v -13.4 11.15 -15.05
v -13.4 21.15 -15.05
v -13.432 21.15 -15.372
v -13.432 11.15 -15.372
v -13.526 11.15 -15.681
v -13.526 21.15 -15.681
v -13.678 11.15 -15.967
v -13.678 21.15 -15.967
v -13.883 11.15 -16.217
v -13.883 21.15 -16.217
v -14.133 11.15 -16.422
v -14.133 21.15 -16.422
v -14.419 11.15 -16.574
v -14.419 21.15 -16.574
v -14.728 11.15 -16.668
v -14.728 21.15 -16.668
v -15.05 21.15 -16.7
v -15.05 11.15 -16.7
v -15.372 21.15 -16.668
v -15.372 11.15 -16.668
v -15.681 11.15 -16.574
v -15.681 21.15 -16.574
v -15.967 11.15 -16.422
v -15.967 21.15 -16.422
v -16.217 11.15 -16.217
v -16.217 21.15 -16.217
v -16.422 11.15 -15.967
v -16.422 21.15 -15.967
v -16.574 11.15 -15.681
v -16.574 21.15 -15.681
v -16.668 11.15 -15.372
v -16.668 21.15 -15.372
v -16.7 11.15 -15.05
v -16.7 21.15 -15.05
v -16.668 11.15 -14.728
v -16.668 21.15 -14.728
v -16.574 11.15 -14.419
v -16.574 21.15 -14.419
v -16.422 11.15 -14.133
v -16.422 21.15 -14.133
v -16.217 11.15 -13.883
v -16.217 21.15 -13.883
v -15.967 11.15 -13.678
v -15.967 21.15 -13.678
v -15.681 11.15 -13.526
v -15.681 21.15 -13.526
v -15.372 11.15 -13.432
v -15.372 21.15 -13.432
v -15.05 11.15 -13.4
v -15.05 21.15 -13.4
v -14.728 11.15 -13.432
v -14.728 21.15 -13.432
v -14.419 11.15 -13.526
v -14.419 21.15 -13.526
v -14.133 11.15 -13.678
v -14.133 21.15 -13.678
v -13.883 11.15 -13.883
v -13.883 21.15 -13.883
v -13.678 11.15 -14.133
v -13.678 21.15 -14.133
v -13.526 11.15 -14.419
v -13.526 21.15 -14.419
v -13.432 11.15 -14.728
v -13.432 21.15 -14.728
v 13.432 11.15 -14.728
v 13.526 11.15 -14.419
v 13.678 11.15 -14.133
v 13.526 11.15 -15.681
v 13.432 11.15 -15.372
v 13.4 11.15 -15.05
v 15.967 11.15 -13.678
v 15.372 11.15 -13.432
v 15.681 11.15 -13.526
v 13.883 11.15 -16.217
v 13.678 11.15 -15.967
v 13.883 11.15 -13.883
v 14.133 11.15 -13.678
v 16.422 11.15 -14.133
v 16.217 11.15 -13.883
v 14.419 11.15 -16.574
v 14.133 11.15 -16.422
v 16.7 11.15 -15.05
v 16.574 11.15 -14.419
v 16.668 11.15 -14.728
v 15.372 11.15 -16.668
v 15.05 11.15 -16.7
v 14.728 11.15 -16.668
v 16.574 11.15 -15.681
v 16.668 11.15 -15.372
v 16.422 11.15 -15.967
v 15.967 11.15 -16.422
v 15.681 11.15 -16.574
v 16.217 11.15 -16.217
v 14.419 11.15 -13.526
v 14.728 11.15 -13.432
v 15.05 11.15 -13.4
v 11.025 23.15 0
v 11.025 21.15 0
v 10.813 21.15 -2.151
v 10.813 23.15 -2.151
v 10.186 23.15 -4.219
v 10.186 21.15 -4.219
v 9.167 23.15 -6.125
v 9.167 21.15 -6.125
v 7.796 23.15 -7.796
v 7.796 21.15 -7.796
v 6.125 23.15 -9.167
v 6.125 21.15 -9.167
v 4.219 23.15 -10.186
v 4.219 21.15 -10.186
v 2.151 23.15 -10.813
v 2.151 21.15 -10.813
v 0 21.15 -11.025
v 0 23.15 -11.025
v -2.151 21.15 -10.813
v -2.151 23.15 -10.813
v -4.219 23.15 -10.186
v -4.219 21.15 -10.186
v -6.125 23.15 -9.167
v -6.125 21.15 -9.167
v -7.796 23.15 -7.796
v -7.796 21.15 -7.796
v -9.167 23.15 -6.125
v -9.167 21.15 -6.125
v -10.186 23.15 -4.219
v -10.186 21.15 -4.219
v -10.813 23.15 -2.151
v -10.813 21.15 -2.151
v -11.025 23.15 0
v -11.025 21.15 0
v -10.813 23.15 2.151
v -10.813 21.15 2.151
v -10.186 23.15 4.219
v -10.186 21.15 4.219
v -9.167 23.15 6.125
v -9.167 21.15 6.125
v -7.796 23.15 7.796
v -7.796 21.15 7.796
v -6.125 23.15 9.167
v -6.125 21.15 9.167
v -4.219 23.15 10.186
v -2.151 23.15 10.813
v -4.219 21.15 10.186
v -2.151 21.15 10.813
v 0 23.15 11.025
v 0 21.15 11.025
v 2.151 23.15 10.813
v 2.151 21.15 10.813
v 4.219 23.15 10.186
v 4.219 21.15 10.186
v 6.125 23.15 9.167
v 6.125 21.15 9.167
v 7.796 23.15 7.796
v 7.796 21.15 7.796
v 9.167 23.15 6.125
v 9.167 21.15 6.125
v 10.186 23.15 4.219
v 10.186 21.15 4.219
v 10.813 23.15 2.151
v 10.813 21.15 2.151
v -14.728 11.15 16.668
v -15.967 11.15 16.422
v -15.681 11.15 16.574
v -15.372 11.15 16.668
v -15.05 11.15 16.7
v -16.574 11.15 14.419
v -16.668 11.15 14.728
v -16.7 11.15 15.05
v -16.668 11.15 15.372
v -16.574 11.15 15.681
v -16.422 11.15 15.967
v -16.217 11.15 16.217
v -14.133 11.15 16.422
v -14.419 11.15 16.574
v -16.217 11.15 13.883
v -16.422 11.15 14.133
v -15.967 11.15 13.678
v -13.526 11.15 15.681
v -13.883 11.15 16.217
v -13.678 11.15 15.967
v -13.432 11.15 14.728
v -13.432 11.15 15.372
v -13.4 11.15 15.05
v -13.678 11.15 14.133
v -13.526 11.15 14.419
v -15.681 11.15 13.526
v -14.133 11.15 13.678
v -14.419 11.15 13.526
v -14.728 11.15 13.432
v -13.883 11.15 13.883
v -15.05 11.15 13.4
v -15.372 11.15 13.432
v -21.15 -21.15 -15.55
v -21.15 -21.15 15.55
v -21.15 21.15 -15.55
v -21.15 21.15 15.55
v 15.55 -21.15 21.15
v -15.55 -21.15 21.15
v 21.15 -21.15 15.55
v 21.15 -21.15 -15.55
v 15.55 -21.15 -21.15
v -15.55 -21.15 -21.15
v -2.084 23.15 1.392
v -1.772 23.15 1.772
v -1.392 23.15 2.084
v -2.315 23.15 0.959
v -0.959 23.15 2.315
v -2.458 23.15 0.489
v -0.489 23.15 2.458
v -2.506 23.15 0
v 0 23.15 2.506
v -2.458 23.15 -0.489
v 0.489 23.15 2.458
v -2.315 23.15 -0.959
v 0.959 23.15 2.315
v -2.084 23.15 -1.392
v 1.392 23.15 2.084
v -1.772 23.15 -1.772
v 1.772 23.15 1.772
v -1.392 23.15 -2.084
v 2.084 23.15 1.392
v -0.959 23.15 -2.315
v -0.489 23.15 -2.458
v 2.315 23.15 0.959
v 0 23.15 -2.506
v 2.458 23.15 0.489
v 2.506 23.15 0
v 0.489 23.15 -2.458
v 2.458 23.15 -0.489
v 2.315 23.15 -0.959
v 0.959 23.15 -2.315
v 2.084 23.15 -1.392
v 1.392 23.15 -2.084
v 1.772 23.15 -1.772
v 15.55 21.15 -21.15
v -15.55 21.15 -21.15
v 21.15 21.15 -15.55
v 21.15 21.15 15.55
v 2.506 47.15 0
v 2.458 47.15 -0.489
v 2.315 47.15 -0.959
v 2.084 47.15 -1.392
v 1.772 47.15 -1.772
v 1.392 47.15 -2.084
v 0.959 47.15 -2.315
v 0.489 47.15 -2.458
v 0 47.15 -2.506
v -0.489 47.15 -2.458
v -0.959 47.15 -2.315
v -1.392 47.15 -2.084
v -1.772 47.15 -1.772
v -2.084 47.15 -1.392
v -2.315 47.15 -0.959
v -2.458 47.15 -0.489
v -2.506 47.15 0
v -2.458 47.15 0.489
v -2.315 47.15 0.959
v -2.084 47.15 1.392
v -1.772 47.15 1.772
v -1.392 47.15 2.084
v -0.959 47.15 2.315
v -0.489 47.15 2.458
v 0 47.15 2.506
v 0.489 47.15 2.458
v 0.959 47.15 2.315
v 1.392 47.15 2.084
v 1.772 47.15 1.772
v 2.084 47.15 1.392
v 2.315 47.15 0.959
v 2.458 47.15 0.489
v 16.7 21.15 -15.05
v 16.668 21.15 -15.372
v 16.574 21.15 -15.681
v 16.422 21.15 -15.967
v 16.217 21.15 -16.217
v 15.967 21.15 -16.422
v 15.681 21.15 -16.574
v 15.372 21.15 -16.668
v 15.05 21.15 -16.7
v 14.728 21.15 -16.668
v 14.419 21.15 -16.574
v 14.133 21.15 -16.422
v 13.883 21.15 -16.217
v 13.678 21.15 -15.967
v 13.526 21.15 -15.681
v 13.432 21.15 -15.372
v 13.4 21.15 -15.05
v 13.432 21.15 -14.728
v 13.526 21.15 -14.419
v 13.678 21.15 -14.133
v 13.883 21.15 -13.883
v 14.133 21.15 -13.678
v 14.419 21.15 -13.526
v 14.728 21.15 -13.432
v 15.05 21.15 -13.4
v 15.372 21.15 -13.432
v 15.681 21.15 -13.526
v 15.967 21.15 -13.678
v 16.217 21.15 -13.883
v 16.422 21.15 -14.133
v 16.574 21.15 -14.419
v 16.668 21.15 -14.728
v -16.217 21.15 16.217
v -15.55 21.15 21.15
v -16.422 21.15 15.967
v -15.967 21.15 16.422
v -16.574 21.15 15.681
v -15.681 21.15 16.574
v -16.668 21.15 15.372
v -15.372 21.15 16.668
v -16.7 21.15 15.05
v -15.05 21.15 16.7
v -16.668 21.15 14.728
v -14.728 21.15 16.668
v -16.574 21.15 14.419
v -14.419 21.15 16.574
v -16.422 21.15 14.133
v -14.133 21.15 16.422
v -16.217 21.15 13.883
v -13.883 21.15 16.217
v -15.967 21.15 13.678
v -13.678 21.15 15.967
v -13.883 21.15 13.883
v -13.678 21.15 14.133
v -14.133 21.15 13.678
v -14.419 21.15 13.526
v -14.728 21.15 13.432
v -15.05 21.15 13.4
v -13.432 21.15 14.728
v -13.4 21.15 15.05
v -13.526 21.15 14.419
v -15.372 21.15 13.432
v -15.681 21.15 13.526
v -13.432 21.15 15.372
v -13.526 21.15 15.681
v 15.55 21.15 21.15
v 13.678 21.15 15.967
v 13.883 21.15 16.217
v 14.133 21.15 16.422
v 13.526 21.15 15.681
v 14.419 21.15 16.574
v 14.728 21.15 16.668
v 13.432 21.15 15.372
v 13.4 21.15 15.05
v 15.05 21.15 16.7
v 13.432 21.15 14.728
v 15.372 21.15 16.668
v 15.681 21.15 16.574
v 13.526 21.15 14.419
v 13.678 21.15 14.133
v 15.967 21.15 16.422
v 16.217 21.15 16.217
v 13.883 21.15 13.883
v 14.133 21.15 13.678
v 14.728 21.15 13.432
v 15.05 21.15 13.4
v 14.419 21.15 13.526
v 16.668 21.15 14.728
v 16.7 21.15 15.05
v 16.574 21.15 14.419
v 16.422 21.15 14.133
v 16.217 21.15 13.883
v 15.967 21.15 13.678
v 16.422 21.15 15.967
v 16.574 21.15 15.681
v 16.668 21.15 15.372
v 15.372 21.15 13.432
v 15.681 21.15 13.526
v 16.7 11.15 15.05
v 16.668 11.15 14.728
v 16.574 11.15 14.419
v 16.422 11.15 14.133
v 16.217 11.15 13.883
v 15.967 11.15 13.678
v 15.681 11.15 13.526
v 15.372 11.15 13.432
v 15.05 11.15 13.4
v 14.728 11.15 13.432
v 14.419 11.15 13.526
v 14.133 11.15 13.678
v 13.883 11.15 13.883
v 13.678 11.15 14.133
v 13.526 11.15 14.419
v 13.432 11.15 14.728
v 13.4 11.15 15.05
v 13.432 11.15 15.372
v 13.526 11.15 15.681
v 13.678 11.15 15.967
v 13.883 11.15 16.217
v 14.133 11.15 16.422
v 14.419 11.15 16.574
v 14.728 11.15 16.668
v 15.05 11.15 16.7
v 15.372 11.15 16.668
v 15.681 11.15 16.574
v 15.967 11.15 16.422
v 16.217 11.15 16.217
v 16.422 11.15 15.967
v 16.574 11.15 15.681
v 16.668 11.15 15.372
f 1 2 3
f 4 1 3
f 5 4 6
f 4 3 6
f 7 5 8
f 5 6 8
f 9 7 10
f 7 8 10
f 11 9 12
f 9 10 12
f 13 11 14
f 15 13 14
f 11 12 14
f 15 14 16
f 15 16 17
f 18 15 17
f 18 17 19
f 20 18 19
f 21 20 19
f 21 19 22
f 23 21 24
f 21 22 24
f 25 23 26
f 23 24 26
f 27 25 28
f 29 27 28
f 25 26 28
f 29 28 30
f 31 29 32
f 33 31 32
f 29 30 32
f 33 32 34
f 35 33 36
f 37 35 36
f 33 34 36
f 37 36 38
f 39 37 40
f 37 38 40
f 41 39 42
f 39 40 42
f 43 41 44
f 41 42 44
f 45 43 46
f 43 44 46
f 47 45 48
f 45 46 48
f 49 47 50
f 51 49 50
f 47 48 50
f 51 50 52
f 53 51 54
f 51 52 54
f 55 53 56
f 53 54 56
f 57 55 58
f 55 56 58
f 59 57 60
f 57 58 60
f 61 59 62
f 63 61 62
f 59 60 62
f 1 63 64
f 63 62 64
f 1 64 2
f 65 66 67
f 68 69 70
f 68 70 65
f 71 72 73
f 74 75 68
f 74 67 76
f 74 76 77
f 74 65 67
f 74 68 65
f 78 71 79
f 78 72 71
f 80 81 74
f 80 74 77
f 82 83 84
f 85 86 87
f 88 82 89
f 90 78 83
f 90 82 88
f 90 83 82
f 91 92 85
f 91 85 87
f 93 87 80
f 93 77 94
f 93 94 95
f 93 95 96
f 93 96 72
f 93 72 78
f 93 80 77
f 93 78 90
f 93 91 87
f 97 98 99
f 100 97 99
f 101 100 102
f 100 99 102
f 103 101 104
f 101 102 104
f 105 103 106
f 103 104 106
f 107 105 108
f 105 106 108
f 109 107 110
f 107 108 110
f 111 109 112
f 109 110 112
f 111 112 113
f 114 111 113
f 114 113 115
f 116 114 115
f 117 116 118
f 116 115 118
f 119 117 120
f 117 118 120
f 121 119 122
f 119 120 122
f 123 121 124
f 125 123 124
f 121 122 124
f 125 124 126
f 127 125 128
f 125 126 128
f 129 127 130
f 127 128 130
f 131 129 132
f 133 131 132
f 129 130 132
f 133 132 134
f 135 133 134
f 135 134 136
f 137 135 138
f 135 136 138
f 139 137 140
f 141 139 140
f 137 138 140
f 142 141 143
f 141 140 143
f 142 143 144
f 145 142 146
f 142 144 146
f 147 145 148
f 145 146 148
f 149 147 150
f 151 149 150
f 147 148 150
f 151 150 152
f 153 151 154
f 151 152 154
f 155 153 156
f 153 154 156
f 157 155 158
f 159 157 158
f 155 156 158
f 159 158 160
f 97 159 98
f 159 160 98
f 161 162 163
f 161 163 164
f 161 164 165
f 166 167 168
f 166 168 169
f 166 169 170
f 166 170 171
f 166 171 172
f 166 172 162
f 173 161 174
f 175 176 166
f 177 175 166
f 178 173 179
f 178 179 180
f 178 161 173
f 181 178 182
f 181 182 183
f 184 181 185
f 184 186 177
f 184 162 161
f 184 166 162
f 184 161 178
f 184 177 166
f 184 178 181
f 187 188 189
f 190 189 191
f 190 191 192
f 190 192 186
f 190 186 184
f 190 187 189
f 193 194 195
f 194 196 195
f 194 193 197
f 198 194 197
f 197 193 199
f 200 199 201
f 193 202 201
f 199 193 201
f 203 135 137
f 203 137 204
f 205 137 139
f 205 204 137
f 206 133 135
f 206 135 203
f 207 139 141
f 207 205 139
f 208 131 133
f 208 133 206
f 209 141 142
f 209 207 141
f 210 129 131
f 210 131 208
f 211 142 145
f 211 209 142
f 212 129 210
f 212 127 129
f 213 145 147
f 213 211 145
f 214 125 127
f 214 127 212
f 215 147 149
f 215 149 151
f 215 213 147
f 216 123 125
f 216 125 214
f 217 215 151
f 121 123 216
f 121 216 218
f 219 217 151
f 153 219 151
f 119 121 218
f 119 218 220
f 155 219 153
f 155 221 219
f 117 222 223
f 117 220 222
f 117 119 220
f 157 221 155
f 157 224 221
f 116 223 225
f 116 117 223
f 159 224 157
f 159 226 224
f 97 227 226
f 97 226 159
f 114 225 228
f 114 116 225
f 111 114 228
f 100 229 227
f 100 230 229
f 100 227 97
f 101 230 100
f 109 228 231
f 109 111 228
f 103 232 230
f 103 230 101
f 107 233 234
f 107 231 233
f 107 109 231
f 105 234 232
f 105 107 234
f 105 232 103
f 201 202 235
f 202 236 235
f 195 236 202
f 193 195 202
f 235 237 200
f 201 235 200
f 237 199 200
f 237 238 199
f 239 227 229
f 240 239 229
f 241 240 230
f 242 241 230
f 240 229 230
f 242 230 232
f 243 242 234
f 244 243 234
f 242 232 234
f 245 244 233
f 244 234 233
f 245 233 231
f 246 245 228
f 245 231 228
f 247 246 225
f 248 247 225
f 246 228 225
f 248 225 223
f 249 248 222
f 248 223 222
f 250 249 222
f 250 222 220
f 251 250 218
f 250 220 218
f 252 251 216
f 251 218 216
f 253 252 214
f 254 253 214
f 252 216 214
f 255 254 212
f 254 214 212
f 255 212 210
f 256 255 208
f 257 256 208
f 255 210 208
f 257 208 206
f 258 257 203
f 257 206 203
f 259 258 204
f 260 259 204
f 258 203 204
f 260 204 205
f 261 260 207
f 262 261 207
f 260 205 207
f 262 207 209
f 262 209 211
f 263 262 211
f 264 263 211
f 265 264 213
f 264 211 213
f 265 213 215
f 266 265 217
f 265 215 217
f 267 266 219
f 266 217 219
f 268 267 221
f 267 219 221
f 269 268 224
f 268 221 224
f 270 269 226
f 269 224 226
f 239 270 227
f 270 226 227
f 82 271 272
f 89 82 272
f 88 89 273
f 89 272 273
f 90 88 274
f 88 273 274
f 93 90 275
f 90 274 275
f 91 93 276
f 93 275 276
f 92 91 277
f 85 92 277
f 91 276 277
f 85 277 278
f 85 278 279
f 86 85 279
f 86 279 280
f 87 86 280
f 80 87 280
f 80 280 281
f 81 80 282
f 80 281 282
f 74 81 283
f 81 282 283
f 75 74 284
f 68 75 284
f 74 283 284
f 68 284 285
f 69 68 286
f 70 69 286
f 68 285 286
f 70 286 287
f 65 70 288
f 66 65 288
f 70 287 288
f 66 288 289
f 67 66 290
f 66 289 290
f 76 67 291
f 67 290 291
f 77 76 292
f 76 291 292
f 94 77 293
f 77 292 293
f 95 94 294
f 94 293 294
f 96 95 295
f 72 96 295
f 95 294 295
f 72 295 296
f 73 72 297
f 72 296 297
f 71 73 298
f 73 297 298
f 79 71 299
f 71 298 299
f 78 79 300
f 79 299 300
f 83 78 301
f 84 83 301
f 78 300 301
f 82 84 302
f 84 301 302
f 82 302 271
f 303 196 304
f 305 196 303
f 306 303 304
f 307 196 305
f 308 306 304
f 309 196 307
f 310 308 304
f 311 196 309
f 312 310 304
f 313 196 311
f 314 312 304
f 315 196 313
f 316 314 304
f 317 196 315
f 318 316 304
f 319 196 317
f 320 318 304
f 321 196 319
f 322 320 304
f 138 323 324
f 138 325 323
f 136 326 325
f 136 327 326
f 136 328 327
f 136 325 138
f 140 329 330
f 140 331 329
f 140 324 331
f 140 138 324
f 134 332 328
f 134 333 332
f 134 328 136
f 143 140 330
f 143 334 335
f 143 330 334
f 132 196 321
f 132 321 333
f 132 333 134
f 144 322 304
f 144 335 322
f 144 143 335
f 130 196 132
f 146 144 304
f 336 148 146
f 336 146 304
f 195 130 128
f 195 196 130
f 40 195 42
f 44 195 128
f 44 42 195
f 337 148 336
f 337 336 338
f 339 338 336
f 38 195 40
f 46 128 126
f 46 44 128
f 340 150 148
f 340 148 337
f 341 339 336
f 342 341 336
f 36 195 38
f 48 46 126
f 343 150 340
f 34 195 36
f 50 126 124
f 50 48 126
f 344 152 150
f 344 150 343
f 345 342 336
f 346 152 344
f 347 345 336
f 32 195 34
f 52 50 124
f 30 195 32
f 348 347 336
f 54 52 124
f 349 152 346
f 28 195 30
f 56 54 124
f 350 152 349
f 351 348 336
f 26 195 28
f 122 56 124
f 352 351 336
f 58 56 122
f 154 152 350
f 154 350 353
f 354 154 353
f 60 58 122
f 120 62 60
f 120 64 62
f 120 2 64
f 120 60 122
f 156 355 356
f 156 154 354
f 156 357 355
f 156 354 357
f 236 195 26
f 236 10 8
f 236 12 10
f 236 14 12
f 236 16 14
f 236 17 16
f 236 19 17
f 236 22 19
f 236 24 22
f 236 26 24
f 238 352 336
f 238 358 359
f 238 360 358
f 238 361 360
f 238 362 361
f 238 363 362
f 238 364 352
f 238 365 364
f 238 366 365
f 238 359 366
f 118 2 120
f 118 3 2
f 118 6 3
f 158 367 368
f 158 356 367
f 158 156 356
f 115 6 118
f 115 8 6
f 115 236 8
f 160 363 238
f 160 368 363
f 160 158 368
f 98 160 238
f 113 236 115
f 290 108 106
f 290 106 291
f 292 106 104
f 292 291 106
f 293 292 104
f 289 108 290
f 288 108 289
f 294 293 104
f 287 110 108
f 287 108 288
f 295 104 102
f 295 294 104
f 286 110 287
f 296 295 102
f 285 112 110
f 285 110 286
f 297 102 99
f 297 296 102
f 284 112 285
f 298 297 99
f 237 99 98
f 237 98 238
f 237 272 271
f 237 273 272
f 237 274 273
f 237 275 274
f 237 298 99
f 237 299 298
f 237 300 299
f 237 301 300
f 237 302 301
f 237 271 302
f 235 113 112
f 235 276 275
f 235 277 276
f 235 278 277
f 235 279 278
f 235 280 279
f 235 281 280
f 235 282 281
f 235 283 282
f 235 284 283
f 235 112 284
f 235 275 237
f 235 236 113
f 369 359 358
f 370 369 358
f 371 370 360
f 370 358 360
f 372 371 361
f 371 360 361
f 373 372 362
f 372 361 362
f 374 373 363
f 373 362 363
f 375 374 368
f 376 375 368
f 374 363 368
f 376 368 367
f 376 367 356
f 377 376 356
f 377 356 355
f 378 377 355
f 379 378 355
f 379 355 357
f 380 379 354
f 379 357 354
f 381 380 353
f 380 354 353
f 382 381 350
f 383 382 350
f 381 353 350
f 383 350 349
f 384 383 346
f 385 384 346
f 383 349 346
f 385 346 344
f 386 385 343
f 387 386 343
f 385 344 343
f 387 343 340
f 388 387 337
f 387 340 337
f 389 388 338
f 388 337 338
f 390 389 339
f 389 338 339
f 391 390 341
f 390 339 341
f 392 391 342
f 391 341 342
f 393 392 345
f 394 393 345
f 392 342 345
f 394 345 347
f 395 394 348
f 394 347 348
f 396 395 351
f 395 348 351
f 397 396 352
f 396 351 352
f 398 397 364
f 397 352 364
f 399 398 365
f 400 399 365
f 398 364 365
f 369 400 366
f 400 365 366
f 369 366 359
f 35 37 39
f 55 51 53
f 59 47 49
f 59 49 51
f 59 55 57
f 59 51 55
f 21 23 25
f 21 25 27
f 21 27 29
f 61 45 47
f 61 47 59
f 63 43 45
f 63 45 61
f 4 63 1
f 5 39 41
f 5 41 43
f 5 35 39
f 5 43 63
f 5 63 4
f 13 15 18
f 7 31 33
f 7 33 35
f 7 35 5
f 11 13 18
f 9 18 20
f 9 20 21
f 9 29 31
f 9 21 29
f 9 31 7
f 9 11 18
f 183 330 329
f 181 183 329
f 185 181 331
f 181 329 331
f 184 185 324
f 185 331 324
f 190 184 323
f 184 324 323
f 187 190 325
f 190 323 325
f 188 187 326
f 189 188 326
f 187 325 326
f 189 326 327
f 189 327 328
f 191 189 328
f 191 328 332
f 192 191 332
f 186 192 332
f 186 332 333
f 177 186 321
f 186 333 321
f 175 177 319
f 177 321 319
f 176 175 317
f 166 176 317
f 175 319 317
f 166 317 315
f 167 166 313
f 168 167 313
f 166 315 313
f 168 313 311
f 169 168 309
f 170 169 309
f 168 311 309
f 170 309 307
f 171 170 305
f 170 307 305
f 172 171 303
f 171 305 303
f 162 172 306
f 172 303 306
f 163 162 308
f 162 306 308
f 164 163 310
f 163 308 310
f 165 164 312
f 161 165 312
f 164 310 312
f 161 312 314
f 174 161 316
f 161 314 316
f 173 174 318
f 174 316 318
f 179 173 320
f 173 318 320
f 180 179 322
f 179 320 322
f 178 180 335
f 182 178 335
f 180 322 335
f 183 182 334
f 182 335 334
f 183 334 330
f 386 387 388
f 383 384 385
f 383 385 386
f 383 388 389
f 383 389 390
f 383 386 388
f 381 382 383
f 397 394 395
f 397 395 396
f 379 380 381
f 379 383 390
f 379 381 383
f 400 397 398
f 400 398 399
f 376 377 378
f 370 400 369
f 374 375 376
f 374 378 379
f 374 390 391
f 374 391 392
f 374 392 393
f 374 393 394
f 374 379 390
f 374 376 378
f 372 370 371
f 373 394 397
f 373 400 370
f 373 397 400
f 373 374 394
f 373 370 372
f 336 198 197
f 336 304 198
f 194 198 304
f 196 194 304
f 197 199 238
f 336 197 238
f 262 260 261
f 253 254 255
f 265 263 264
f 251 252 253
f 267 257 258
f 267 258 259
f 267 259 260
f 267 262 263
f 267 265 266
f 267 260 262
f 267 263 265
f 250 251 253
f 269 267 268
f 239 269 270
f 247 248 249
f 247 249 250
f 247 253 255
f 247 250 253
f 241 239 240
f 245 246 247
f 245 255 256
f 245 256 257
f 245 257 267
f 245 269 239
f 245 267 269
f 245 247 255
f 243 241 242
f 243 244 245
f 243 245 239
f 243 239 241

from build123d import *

# Parameters (mm, degrees)
ESBO_O1_W                = 42.3
ESBO_O1_H                = 42.3
RESSALTO_EXTRUS_O1_DEPTH = 21.15
ESBO_O2_R                = 11.025
RESSALTO_EXTRUS_O2_DEPTH = 2
ESBO_O3_R                = 2.506
RESSALTO_EXTRUS_O3_DEPTH = 24
CHANFRO1_SIZE            = 5.6
ESBO_O4_R                = 1.65
CORTE_EXTRUS_O1_DEPTH    = 10


with BuildPart() as part:
    # Esboço1 → Ressalto-extrusão1 (new body, symmetric)
    with BuildSketch(Plane(origin=(0, 0, 0), x_dir=(1, 0, 0), z_dir=(0, 1, 0))):
        Rectangle(ESBO_O1_W, ESBO_O1_H)
    extrude(amount=RESSALTO_EXTRUS_O1_DEPTH, both=True)

    # Esboço2 → Ressalto-extrusão2 (add)
    with BuildSketch(Plane(origin=(0, 21.15, 0), x_dir=(1, 0, 0), z_dir=(0, 1, 0))):
        Circle(ESBO_O2_R)
    extrude(amount=RESSALTO_EXTRUS_O2_DEPTH)

    # Esboço3 → Ressalto-extrusão3 (add)
    with BuildSketch(Plane(origin=(0, 23.15, 0), x_dir=(1, 0, 0), z_dir=(0, 1, 0))):
        Circle(ESBO_O3_R)
    extrude(amount=RESSALTO_EXTRUS_O3_DEPTH)

    # Chanfro1
    chanfro1_edges = [part.edges().sort_by_distance(p)[0] for p in [
        (21.15, 0, 21.15),
        (-21.15, 0, 21.15),
        (-21.15, 0, -21.15),
        (21.15, 0, -21.15),
    ]]
    chamfer(chanfro1_edges, length=CHANFRO1_SIZE)

    # Esboço4 → Corte-extrusão1 (cut)
    with BuildSketch(Plane(origin=(0, 21.15, 0), x_dir=(1, 0, 0), z_dir=(0, 1, 0))):
        with Locations((-15.05, 15.05)):
            Circle(ESBO_O4_R)
        with Locations((15.05, 15.05)):
            Circle(ESBO_O4_R)
        with Locations((15.05, -15.05)):
            Circle(ESBO_O4_R)
        with Locations((-15.05, -15.05)):
            Circle(ESBO_O4_R)
    extrude(amount=-CORTE_EXTRUS_O1_DEPTH, mode=Mode.SUBTRACT)


solid = part.part
